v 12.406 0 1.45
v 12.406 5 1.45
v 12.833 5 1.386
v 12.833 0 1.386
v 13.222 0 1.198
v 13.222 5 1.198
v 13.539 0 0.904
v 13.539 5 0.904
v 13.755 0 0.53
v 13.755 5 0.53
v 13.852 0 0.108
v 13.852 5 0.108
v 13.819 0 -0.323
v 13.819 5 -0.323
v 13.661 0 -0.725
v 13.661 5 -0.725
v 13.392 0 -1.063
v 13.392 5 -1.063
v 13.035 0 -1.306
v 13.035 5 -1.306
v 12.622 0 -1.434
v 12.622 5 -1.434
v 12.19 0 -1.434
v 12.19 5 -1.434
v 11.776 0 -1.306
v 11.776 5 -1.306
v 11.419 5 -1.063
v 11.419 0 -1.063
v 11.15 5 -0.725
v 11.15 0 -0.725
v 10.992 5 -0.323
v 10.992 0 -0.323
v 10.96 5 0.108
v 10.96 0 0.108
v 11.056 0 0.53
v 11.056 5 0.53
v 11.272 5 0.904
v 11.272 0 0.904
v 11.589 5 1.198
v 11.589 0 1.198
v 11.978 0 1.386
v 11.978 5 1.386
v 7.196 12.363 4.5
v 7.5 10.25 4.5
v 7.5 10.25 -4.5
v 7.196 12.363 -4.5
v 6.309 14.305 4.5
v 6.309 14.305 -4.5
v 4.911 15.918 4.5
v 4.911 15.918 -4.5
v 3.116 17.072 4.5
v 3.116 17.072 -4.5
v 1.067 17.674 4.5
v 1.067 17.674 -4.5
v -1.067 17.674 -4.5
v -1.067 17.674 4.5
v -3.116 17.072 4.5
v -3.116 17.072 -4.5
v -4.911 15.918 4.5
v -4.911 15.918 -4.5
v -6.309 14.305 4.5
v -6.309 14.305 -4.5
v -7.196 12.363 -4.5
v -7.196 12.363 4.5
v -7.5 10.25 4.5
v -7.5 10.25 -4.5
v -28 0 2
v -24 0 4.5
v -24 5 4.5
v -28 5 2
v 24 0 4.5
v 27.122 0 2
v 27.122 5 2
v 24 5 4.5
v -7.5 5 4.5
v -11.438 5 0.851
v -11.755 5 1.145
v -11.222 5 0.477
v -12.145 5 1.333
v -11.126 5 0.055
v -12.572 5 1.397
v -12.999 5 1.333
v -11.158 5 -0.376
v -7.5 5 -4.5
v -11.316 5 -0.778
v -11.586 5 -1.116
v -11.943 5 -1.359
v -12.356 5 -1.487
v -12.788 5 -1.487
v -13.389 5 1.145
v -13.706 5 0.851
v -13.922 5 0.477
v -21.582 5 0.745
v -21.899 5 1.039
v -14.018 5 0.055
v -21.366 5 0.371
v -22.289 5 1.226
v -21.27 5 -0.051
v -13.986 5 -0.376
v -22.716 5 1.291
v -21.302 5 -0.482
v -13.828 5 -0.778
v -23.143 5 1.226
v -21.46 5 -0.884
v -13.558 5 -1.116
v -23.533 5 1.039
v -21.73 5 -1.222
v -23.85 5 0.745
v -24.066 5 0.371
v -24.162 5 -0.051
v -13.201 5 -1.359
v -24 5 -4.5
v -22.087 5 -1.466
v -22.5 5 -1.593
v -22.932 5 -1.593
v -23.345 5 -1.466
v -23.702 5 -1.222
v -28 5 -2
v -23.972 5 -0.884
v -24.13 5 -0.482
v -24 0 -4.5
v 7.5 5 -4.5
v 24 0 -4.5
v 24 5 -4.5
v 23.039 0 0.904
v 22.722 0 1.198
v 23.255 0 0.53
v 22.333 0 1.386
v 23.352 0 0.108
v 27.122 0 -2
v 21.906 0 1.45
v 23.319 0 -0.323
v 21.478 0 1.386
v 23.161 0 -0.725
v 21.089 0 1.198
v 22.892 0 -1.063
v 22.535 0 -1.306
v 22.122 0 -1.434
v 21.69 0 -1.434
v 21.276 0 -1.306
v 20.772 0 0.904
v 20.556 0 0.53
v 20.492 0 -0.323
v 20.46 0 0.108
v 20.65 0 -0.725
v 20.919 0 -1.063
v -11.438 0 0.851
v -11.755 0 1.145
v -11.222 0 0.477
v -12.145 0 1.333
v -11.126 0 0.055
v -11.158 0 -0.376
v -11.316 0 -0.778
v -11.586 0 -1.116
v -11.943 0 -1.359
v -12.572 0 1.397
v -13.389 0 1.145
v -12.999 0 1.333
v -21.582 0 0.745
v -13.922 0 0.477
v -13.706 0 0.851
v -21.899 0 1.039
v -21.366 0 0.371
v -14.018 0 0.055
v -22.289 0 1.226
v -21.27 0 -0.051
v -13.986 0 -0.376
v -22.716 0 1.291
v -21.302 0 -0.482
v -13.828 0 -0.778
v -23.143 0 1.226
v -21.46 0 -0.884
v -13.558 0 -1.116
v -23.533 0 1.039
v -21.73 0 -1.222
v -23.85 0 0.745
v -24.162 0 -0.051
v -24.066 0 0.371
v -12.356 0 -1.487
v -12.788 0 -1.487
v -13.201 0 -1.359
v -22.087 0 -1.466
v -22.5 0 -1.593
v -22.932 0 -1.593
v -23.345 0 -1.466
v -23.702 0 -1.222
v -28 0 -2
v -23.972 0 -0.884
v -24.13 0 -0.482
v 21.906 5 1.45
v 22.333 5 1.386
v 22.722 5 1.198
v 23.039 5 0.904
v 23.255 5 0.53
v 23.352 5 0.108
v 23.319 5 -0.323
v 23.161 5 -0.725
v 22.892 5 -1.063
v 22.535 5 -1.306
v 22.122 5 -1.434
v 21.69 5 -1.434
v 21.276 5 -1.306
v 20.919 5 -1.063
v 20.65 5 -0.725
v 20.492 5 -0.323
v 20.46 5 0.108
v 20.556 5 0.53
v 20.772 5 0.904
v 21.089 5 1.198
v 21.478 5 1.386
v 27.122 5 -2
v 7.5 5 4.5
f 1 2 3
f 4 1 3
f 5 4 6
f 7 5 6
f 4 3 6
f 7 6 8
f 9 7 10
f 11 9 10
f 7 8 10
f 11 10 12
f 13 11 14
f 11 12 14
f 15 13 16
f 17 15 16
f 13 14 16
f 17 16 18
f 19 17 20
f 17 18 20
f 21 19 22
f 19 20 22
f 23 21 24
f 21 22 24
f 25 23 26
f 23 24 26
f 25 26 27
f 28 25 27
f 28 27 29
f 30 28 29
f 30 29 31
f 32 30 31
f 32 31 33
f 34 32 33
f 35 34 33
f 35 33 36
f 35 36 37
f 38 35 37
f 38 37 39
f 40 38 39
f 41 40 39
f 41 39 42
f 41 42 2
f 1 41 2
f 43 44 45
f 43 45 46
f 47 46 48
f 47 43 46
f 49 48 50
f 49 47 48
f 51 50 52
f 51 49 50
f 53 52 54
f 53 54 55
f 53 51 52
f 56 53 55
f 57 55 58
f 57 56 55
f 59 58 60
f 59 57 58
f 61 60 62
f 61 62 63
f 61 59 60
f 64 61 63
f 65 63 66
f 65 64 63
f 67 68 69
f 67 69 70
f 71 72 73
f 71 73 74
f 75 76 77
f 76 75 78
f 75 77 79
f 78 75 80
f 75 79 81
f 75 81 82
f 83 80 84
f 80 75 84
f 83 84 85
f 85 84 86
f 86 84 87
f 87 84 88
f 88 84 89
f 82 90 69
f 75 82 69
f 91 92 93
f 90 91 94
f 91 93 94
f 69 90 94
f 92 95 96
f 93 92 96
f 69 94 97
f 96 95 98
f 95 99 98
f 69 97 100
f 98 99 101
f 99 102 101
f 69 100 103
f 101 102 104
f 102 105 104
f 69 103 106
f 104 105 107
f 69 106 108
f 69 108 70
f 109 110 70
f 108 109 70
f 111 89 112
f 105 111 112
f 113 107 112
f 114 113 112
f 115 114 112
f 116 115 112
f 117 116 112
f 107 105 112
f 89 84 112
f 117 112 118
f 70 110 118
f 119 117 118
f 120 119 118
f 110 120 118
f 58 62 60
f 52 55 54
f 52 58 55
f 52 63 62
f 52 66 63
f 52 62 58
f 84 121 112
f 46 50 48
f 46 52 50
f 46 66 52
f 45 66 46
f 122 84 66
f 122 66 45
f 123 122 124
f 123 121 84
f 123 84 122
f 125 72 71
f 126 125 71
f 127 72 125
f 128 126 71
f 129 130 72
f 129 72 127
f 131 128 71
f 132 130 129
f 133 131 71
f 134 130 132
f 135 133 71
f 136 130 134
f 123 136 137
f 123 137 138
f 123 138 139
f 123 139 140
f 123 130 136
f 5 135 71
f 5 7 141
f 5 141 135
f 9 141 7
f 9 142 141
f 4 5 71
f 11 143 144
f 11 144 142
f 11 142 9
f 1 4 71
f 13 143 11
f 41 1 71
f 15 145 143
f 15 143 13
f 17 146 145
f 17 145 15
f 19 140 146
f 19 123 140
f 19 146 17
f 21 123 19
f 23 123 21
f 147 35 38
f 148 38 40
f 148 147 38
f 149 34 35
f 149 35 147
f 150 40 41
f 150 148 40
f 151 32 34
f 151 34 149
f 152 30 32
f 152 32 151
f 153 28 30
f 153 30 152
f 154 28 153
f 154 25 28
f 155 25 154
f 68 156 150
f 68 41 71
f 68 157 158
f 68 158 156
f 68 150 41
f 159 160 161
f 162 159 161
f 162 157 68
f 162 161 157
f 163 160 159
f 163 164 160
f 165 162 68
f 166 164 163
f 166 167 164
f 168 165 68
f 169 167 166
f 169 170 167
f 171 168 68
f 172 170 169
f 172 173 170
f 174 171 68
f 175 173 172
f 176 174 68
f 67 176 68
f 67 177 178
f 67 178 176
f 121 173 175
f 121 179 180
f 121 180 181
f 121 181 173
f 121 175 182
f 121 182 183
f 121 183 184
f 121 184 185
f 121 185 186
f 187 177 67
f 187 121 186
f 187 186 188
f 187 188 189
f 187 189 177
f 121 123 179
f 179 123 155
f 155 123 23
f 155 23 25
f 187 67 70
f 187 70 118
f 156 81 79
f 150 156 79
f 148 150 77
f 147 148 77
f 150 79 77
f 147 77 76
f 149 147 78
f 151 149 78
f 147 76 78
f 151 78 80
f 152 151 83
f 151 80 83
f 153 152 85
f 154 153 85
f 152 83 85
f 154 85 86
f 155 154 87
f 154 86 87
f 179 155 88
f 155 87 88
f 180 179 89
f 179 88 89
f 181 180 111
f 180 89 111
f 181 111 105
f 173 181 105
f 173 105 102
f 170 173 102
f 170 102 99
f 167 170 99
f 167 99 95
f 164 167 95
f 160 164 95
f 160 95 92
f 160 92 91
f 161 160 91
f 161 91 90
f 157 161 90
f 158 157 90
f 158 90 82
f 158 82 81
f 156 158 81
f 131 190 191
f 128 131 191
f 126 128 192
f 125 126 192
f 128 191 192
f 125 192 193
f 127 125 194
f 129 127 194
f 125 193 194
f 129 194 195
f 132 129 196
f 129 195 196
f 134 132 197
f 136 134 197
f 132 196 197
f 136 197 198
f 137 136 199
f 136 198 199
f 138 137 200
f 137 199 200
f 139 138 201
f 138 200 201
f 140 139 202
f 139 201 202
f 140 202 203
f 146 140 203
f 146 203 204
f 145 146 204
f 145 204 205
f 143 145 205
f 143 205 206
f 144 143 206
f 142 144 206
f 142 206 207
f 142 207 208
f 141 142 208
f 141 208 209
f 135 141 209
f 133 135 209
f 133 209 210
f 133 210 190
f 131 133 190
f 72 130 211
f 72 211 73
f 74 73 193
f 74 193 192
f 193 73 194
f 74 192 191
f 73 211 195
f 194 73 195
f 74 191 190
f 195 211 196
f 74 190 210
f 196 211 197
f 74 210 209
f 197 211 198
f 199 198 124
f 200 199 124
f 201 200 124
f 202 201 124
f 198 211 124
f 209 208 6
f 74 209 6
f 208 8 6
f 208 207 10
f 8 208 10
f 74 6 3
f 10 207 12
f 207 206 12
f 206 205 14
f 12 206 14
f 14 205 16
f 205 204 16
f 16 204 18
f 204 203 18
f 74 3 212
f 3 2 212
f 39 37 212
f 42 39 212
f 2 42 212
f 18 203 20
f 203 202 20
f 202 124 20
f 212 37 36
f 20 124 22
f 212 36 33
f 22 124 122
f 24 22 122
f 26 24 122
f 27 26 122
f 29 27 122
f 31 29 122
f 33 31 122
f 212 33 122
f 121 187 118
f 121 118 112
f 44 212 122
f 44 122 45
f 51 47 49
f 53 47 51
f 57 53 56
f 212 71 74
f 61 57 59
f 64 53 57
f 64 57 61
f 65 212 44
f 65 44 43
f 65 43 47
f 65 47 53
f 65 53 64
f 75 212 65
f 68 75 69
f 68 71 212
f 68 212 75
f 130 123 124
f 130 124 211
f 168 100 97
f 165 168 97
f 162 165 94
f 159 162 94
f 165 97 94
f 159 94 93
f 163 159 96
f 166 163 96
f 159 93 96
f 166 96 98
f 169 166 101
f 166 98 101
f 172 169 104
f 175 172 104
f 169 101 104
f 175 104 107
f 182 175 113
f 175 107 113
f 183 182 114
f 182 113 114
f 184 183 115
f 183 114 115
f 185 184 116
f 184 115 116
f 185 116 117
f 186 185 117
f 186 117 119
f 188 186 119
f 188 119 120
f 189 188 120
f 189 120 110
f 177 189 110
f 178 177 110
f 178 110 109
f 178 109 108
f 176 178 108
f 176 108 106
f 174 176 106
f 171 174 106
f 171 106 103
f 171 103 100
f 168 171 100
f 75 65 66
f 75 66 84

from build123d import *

# Parameters (mm, degrees)
DODANIE_WYCI_GNI_CIE1_DEPTH = 5
DODANIE_WYCI_GNI_CIE2_DEPTH = 9
SZKIC4_R                    = 1.45
WYTNIJ_WYCI_GNI_CIE1_DEPTH  = 6


with BuildPart() as part:
    # Szkic1 → Dodanie-wyciągnięcie1 (new body)
    with BuildSketch(Plane(origin=(0, 0, 0), x_dir=(1, 0, 0), z_dir=(0, 1, 0))):
        Polygon((24, 4.5), (27.122498999, 2), (27.122498999, -2), (24, -4.5), (-24, -4.5), (-28, -2), (-28, 2), (-24, 4.5), align=None)
    extrude(amount=DODANIE_WYCI_GNI_CIE1_DEPTH)

    # Szkic2 → Dodanie-wyciągnięcie2 (add)
    with BuildSketch(Plane.XY.offset(4.5)):
        with BuildLine():
            Line((-7.5, 5), (7.5, 5))
            Line((7.5, 5), (7.5, 10.25))
            ThreePointArc((7.5, 10.25), (0, 17.75), (-7.5, 10.25))
            Line((-7.5, 10.25), (-7.5, 5))
        make_face()
    extrude(amount=-DODANIE_WYCI_GNI_CIE2_DEPTH)

    # Szkic4 → Wytnij-wyciągnięcie1 (cut)
    with BuildSketch(Plane(origin=(0, 5, 0), x_dir=(1, 0, 0), z_dir=(0, 1, 0))):
        with Locations(Location((12.40562475, 0, 0), (0, 0, 270))):
            Circle(SZKIC4_R)
        with Locations(Location((21.90562475, 0, 0), (0, 0, 270))):
            Circle(SZKIC4_R)
        with Locations(Location((-12.57201541, 0.053033314, 0), (0, 0, 270))):
            Circle(SZKIC4_R)
        with Locations(Location((-22.71604623, 0.159099943, 0), (0, 0, 270))):
            Circle(SZKIC4_R)
    extrude(amount=-WYTNIJ_WYCI_GNI_CIE1_DEPTH, mode=Mode.SUBTRACT)


solid = part.part
